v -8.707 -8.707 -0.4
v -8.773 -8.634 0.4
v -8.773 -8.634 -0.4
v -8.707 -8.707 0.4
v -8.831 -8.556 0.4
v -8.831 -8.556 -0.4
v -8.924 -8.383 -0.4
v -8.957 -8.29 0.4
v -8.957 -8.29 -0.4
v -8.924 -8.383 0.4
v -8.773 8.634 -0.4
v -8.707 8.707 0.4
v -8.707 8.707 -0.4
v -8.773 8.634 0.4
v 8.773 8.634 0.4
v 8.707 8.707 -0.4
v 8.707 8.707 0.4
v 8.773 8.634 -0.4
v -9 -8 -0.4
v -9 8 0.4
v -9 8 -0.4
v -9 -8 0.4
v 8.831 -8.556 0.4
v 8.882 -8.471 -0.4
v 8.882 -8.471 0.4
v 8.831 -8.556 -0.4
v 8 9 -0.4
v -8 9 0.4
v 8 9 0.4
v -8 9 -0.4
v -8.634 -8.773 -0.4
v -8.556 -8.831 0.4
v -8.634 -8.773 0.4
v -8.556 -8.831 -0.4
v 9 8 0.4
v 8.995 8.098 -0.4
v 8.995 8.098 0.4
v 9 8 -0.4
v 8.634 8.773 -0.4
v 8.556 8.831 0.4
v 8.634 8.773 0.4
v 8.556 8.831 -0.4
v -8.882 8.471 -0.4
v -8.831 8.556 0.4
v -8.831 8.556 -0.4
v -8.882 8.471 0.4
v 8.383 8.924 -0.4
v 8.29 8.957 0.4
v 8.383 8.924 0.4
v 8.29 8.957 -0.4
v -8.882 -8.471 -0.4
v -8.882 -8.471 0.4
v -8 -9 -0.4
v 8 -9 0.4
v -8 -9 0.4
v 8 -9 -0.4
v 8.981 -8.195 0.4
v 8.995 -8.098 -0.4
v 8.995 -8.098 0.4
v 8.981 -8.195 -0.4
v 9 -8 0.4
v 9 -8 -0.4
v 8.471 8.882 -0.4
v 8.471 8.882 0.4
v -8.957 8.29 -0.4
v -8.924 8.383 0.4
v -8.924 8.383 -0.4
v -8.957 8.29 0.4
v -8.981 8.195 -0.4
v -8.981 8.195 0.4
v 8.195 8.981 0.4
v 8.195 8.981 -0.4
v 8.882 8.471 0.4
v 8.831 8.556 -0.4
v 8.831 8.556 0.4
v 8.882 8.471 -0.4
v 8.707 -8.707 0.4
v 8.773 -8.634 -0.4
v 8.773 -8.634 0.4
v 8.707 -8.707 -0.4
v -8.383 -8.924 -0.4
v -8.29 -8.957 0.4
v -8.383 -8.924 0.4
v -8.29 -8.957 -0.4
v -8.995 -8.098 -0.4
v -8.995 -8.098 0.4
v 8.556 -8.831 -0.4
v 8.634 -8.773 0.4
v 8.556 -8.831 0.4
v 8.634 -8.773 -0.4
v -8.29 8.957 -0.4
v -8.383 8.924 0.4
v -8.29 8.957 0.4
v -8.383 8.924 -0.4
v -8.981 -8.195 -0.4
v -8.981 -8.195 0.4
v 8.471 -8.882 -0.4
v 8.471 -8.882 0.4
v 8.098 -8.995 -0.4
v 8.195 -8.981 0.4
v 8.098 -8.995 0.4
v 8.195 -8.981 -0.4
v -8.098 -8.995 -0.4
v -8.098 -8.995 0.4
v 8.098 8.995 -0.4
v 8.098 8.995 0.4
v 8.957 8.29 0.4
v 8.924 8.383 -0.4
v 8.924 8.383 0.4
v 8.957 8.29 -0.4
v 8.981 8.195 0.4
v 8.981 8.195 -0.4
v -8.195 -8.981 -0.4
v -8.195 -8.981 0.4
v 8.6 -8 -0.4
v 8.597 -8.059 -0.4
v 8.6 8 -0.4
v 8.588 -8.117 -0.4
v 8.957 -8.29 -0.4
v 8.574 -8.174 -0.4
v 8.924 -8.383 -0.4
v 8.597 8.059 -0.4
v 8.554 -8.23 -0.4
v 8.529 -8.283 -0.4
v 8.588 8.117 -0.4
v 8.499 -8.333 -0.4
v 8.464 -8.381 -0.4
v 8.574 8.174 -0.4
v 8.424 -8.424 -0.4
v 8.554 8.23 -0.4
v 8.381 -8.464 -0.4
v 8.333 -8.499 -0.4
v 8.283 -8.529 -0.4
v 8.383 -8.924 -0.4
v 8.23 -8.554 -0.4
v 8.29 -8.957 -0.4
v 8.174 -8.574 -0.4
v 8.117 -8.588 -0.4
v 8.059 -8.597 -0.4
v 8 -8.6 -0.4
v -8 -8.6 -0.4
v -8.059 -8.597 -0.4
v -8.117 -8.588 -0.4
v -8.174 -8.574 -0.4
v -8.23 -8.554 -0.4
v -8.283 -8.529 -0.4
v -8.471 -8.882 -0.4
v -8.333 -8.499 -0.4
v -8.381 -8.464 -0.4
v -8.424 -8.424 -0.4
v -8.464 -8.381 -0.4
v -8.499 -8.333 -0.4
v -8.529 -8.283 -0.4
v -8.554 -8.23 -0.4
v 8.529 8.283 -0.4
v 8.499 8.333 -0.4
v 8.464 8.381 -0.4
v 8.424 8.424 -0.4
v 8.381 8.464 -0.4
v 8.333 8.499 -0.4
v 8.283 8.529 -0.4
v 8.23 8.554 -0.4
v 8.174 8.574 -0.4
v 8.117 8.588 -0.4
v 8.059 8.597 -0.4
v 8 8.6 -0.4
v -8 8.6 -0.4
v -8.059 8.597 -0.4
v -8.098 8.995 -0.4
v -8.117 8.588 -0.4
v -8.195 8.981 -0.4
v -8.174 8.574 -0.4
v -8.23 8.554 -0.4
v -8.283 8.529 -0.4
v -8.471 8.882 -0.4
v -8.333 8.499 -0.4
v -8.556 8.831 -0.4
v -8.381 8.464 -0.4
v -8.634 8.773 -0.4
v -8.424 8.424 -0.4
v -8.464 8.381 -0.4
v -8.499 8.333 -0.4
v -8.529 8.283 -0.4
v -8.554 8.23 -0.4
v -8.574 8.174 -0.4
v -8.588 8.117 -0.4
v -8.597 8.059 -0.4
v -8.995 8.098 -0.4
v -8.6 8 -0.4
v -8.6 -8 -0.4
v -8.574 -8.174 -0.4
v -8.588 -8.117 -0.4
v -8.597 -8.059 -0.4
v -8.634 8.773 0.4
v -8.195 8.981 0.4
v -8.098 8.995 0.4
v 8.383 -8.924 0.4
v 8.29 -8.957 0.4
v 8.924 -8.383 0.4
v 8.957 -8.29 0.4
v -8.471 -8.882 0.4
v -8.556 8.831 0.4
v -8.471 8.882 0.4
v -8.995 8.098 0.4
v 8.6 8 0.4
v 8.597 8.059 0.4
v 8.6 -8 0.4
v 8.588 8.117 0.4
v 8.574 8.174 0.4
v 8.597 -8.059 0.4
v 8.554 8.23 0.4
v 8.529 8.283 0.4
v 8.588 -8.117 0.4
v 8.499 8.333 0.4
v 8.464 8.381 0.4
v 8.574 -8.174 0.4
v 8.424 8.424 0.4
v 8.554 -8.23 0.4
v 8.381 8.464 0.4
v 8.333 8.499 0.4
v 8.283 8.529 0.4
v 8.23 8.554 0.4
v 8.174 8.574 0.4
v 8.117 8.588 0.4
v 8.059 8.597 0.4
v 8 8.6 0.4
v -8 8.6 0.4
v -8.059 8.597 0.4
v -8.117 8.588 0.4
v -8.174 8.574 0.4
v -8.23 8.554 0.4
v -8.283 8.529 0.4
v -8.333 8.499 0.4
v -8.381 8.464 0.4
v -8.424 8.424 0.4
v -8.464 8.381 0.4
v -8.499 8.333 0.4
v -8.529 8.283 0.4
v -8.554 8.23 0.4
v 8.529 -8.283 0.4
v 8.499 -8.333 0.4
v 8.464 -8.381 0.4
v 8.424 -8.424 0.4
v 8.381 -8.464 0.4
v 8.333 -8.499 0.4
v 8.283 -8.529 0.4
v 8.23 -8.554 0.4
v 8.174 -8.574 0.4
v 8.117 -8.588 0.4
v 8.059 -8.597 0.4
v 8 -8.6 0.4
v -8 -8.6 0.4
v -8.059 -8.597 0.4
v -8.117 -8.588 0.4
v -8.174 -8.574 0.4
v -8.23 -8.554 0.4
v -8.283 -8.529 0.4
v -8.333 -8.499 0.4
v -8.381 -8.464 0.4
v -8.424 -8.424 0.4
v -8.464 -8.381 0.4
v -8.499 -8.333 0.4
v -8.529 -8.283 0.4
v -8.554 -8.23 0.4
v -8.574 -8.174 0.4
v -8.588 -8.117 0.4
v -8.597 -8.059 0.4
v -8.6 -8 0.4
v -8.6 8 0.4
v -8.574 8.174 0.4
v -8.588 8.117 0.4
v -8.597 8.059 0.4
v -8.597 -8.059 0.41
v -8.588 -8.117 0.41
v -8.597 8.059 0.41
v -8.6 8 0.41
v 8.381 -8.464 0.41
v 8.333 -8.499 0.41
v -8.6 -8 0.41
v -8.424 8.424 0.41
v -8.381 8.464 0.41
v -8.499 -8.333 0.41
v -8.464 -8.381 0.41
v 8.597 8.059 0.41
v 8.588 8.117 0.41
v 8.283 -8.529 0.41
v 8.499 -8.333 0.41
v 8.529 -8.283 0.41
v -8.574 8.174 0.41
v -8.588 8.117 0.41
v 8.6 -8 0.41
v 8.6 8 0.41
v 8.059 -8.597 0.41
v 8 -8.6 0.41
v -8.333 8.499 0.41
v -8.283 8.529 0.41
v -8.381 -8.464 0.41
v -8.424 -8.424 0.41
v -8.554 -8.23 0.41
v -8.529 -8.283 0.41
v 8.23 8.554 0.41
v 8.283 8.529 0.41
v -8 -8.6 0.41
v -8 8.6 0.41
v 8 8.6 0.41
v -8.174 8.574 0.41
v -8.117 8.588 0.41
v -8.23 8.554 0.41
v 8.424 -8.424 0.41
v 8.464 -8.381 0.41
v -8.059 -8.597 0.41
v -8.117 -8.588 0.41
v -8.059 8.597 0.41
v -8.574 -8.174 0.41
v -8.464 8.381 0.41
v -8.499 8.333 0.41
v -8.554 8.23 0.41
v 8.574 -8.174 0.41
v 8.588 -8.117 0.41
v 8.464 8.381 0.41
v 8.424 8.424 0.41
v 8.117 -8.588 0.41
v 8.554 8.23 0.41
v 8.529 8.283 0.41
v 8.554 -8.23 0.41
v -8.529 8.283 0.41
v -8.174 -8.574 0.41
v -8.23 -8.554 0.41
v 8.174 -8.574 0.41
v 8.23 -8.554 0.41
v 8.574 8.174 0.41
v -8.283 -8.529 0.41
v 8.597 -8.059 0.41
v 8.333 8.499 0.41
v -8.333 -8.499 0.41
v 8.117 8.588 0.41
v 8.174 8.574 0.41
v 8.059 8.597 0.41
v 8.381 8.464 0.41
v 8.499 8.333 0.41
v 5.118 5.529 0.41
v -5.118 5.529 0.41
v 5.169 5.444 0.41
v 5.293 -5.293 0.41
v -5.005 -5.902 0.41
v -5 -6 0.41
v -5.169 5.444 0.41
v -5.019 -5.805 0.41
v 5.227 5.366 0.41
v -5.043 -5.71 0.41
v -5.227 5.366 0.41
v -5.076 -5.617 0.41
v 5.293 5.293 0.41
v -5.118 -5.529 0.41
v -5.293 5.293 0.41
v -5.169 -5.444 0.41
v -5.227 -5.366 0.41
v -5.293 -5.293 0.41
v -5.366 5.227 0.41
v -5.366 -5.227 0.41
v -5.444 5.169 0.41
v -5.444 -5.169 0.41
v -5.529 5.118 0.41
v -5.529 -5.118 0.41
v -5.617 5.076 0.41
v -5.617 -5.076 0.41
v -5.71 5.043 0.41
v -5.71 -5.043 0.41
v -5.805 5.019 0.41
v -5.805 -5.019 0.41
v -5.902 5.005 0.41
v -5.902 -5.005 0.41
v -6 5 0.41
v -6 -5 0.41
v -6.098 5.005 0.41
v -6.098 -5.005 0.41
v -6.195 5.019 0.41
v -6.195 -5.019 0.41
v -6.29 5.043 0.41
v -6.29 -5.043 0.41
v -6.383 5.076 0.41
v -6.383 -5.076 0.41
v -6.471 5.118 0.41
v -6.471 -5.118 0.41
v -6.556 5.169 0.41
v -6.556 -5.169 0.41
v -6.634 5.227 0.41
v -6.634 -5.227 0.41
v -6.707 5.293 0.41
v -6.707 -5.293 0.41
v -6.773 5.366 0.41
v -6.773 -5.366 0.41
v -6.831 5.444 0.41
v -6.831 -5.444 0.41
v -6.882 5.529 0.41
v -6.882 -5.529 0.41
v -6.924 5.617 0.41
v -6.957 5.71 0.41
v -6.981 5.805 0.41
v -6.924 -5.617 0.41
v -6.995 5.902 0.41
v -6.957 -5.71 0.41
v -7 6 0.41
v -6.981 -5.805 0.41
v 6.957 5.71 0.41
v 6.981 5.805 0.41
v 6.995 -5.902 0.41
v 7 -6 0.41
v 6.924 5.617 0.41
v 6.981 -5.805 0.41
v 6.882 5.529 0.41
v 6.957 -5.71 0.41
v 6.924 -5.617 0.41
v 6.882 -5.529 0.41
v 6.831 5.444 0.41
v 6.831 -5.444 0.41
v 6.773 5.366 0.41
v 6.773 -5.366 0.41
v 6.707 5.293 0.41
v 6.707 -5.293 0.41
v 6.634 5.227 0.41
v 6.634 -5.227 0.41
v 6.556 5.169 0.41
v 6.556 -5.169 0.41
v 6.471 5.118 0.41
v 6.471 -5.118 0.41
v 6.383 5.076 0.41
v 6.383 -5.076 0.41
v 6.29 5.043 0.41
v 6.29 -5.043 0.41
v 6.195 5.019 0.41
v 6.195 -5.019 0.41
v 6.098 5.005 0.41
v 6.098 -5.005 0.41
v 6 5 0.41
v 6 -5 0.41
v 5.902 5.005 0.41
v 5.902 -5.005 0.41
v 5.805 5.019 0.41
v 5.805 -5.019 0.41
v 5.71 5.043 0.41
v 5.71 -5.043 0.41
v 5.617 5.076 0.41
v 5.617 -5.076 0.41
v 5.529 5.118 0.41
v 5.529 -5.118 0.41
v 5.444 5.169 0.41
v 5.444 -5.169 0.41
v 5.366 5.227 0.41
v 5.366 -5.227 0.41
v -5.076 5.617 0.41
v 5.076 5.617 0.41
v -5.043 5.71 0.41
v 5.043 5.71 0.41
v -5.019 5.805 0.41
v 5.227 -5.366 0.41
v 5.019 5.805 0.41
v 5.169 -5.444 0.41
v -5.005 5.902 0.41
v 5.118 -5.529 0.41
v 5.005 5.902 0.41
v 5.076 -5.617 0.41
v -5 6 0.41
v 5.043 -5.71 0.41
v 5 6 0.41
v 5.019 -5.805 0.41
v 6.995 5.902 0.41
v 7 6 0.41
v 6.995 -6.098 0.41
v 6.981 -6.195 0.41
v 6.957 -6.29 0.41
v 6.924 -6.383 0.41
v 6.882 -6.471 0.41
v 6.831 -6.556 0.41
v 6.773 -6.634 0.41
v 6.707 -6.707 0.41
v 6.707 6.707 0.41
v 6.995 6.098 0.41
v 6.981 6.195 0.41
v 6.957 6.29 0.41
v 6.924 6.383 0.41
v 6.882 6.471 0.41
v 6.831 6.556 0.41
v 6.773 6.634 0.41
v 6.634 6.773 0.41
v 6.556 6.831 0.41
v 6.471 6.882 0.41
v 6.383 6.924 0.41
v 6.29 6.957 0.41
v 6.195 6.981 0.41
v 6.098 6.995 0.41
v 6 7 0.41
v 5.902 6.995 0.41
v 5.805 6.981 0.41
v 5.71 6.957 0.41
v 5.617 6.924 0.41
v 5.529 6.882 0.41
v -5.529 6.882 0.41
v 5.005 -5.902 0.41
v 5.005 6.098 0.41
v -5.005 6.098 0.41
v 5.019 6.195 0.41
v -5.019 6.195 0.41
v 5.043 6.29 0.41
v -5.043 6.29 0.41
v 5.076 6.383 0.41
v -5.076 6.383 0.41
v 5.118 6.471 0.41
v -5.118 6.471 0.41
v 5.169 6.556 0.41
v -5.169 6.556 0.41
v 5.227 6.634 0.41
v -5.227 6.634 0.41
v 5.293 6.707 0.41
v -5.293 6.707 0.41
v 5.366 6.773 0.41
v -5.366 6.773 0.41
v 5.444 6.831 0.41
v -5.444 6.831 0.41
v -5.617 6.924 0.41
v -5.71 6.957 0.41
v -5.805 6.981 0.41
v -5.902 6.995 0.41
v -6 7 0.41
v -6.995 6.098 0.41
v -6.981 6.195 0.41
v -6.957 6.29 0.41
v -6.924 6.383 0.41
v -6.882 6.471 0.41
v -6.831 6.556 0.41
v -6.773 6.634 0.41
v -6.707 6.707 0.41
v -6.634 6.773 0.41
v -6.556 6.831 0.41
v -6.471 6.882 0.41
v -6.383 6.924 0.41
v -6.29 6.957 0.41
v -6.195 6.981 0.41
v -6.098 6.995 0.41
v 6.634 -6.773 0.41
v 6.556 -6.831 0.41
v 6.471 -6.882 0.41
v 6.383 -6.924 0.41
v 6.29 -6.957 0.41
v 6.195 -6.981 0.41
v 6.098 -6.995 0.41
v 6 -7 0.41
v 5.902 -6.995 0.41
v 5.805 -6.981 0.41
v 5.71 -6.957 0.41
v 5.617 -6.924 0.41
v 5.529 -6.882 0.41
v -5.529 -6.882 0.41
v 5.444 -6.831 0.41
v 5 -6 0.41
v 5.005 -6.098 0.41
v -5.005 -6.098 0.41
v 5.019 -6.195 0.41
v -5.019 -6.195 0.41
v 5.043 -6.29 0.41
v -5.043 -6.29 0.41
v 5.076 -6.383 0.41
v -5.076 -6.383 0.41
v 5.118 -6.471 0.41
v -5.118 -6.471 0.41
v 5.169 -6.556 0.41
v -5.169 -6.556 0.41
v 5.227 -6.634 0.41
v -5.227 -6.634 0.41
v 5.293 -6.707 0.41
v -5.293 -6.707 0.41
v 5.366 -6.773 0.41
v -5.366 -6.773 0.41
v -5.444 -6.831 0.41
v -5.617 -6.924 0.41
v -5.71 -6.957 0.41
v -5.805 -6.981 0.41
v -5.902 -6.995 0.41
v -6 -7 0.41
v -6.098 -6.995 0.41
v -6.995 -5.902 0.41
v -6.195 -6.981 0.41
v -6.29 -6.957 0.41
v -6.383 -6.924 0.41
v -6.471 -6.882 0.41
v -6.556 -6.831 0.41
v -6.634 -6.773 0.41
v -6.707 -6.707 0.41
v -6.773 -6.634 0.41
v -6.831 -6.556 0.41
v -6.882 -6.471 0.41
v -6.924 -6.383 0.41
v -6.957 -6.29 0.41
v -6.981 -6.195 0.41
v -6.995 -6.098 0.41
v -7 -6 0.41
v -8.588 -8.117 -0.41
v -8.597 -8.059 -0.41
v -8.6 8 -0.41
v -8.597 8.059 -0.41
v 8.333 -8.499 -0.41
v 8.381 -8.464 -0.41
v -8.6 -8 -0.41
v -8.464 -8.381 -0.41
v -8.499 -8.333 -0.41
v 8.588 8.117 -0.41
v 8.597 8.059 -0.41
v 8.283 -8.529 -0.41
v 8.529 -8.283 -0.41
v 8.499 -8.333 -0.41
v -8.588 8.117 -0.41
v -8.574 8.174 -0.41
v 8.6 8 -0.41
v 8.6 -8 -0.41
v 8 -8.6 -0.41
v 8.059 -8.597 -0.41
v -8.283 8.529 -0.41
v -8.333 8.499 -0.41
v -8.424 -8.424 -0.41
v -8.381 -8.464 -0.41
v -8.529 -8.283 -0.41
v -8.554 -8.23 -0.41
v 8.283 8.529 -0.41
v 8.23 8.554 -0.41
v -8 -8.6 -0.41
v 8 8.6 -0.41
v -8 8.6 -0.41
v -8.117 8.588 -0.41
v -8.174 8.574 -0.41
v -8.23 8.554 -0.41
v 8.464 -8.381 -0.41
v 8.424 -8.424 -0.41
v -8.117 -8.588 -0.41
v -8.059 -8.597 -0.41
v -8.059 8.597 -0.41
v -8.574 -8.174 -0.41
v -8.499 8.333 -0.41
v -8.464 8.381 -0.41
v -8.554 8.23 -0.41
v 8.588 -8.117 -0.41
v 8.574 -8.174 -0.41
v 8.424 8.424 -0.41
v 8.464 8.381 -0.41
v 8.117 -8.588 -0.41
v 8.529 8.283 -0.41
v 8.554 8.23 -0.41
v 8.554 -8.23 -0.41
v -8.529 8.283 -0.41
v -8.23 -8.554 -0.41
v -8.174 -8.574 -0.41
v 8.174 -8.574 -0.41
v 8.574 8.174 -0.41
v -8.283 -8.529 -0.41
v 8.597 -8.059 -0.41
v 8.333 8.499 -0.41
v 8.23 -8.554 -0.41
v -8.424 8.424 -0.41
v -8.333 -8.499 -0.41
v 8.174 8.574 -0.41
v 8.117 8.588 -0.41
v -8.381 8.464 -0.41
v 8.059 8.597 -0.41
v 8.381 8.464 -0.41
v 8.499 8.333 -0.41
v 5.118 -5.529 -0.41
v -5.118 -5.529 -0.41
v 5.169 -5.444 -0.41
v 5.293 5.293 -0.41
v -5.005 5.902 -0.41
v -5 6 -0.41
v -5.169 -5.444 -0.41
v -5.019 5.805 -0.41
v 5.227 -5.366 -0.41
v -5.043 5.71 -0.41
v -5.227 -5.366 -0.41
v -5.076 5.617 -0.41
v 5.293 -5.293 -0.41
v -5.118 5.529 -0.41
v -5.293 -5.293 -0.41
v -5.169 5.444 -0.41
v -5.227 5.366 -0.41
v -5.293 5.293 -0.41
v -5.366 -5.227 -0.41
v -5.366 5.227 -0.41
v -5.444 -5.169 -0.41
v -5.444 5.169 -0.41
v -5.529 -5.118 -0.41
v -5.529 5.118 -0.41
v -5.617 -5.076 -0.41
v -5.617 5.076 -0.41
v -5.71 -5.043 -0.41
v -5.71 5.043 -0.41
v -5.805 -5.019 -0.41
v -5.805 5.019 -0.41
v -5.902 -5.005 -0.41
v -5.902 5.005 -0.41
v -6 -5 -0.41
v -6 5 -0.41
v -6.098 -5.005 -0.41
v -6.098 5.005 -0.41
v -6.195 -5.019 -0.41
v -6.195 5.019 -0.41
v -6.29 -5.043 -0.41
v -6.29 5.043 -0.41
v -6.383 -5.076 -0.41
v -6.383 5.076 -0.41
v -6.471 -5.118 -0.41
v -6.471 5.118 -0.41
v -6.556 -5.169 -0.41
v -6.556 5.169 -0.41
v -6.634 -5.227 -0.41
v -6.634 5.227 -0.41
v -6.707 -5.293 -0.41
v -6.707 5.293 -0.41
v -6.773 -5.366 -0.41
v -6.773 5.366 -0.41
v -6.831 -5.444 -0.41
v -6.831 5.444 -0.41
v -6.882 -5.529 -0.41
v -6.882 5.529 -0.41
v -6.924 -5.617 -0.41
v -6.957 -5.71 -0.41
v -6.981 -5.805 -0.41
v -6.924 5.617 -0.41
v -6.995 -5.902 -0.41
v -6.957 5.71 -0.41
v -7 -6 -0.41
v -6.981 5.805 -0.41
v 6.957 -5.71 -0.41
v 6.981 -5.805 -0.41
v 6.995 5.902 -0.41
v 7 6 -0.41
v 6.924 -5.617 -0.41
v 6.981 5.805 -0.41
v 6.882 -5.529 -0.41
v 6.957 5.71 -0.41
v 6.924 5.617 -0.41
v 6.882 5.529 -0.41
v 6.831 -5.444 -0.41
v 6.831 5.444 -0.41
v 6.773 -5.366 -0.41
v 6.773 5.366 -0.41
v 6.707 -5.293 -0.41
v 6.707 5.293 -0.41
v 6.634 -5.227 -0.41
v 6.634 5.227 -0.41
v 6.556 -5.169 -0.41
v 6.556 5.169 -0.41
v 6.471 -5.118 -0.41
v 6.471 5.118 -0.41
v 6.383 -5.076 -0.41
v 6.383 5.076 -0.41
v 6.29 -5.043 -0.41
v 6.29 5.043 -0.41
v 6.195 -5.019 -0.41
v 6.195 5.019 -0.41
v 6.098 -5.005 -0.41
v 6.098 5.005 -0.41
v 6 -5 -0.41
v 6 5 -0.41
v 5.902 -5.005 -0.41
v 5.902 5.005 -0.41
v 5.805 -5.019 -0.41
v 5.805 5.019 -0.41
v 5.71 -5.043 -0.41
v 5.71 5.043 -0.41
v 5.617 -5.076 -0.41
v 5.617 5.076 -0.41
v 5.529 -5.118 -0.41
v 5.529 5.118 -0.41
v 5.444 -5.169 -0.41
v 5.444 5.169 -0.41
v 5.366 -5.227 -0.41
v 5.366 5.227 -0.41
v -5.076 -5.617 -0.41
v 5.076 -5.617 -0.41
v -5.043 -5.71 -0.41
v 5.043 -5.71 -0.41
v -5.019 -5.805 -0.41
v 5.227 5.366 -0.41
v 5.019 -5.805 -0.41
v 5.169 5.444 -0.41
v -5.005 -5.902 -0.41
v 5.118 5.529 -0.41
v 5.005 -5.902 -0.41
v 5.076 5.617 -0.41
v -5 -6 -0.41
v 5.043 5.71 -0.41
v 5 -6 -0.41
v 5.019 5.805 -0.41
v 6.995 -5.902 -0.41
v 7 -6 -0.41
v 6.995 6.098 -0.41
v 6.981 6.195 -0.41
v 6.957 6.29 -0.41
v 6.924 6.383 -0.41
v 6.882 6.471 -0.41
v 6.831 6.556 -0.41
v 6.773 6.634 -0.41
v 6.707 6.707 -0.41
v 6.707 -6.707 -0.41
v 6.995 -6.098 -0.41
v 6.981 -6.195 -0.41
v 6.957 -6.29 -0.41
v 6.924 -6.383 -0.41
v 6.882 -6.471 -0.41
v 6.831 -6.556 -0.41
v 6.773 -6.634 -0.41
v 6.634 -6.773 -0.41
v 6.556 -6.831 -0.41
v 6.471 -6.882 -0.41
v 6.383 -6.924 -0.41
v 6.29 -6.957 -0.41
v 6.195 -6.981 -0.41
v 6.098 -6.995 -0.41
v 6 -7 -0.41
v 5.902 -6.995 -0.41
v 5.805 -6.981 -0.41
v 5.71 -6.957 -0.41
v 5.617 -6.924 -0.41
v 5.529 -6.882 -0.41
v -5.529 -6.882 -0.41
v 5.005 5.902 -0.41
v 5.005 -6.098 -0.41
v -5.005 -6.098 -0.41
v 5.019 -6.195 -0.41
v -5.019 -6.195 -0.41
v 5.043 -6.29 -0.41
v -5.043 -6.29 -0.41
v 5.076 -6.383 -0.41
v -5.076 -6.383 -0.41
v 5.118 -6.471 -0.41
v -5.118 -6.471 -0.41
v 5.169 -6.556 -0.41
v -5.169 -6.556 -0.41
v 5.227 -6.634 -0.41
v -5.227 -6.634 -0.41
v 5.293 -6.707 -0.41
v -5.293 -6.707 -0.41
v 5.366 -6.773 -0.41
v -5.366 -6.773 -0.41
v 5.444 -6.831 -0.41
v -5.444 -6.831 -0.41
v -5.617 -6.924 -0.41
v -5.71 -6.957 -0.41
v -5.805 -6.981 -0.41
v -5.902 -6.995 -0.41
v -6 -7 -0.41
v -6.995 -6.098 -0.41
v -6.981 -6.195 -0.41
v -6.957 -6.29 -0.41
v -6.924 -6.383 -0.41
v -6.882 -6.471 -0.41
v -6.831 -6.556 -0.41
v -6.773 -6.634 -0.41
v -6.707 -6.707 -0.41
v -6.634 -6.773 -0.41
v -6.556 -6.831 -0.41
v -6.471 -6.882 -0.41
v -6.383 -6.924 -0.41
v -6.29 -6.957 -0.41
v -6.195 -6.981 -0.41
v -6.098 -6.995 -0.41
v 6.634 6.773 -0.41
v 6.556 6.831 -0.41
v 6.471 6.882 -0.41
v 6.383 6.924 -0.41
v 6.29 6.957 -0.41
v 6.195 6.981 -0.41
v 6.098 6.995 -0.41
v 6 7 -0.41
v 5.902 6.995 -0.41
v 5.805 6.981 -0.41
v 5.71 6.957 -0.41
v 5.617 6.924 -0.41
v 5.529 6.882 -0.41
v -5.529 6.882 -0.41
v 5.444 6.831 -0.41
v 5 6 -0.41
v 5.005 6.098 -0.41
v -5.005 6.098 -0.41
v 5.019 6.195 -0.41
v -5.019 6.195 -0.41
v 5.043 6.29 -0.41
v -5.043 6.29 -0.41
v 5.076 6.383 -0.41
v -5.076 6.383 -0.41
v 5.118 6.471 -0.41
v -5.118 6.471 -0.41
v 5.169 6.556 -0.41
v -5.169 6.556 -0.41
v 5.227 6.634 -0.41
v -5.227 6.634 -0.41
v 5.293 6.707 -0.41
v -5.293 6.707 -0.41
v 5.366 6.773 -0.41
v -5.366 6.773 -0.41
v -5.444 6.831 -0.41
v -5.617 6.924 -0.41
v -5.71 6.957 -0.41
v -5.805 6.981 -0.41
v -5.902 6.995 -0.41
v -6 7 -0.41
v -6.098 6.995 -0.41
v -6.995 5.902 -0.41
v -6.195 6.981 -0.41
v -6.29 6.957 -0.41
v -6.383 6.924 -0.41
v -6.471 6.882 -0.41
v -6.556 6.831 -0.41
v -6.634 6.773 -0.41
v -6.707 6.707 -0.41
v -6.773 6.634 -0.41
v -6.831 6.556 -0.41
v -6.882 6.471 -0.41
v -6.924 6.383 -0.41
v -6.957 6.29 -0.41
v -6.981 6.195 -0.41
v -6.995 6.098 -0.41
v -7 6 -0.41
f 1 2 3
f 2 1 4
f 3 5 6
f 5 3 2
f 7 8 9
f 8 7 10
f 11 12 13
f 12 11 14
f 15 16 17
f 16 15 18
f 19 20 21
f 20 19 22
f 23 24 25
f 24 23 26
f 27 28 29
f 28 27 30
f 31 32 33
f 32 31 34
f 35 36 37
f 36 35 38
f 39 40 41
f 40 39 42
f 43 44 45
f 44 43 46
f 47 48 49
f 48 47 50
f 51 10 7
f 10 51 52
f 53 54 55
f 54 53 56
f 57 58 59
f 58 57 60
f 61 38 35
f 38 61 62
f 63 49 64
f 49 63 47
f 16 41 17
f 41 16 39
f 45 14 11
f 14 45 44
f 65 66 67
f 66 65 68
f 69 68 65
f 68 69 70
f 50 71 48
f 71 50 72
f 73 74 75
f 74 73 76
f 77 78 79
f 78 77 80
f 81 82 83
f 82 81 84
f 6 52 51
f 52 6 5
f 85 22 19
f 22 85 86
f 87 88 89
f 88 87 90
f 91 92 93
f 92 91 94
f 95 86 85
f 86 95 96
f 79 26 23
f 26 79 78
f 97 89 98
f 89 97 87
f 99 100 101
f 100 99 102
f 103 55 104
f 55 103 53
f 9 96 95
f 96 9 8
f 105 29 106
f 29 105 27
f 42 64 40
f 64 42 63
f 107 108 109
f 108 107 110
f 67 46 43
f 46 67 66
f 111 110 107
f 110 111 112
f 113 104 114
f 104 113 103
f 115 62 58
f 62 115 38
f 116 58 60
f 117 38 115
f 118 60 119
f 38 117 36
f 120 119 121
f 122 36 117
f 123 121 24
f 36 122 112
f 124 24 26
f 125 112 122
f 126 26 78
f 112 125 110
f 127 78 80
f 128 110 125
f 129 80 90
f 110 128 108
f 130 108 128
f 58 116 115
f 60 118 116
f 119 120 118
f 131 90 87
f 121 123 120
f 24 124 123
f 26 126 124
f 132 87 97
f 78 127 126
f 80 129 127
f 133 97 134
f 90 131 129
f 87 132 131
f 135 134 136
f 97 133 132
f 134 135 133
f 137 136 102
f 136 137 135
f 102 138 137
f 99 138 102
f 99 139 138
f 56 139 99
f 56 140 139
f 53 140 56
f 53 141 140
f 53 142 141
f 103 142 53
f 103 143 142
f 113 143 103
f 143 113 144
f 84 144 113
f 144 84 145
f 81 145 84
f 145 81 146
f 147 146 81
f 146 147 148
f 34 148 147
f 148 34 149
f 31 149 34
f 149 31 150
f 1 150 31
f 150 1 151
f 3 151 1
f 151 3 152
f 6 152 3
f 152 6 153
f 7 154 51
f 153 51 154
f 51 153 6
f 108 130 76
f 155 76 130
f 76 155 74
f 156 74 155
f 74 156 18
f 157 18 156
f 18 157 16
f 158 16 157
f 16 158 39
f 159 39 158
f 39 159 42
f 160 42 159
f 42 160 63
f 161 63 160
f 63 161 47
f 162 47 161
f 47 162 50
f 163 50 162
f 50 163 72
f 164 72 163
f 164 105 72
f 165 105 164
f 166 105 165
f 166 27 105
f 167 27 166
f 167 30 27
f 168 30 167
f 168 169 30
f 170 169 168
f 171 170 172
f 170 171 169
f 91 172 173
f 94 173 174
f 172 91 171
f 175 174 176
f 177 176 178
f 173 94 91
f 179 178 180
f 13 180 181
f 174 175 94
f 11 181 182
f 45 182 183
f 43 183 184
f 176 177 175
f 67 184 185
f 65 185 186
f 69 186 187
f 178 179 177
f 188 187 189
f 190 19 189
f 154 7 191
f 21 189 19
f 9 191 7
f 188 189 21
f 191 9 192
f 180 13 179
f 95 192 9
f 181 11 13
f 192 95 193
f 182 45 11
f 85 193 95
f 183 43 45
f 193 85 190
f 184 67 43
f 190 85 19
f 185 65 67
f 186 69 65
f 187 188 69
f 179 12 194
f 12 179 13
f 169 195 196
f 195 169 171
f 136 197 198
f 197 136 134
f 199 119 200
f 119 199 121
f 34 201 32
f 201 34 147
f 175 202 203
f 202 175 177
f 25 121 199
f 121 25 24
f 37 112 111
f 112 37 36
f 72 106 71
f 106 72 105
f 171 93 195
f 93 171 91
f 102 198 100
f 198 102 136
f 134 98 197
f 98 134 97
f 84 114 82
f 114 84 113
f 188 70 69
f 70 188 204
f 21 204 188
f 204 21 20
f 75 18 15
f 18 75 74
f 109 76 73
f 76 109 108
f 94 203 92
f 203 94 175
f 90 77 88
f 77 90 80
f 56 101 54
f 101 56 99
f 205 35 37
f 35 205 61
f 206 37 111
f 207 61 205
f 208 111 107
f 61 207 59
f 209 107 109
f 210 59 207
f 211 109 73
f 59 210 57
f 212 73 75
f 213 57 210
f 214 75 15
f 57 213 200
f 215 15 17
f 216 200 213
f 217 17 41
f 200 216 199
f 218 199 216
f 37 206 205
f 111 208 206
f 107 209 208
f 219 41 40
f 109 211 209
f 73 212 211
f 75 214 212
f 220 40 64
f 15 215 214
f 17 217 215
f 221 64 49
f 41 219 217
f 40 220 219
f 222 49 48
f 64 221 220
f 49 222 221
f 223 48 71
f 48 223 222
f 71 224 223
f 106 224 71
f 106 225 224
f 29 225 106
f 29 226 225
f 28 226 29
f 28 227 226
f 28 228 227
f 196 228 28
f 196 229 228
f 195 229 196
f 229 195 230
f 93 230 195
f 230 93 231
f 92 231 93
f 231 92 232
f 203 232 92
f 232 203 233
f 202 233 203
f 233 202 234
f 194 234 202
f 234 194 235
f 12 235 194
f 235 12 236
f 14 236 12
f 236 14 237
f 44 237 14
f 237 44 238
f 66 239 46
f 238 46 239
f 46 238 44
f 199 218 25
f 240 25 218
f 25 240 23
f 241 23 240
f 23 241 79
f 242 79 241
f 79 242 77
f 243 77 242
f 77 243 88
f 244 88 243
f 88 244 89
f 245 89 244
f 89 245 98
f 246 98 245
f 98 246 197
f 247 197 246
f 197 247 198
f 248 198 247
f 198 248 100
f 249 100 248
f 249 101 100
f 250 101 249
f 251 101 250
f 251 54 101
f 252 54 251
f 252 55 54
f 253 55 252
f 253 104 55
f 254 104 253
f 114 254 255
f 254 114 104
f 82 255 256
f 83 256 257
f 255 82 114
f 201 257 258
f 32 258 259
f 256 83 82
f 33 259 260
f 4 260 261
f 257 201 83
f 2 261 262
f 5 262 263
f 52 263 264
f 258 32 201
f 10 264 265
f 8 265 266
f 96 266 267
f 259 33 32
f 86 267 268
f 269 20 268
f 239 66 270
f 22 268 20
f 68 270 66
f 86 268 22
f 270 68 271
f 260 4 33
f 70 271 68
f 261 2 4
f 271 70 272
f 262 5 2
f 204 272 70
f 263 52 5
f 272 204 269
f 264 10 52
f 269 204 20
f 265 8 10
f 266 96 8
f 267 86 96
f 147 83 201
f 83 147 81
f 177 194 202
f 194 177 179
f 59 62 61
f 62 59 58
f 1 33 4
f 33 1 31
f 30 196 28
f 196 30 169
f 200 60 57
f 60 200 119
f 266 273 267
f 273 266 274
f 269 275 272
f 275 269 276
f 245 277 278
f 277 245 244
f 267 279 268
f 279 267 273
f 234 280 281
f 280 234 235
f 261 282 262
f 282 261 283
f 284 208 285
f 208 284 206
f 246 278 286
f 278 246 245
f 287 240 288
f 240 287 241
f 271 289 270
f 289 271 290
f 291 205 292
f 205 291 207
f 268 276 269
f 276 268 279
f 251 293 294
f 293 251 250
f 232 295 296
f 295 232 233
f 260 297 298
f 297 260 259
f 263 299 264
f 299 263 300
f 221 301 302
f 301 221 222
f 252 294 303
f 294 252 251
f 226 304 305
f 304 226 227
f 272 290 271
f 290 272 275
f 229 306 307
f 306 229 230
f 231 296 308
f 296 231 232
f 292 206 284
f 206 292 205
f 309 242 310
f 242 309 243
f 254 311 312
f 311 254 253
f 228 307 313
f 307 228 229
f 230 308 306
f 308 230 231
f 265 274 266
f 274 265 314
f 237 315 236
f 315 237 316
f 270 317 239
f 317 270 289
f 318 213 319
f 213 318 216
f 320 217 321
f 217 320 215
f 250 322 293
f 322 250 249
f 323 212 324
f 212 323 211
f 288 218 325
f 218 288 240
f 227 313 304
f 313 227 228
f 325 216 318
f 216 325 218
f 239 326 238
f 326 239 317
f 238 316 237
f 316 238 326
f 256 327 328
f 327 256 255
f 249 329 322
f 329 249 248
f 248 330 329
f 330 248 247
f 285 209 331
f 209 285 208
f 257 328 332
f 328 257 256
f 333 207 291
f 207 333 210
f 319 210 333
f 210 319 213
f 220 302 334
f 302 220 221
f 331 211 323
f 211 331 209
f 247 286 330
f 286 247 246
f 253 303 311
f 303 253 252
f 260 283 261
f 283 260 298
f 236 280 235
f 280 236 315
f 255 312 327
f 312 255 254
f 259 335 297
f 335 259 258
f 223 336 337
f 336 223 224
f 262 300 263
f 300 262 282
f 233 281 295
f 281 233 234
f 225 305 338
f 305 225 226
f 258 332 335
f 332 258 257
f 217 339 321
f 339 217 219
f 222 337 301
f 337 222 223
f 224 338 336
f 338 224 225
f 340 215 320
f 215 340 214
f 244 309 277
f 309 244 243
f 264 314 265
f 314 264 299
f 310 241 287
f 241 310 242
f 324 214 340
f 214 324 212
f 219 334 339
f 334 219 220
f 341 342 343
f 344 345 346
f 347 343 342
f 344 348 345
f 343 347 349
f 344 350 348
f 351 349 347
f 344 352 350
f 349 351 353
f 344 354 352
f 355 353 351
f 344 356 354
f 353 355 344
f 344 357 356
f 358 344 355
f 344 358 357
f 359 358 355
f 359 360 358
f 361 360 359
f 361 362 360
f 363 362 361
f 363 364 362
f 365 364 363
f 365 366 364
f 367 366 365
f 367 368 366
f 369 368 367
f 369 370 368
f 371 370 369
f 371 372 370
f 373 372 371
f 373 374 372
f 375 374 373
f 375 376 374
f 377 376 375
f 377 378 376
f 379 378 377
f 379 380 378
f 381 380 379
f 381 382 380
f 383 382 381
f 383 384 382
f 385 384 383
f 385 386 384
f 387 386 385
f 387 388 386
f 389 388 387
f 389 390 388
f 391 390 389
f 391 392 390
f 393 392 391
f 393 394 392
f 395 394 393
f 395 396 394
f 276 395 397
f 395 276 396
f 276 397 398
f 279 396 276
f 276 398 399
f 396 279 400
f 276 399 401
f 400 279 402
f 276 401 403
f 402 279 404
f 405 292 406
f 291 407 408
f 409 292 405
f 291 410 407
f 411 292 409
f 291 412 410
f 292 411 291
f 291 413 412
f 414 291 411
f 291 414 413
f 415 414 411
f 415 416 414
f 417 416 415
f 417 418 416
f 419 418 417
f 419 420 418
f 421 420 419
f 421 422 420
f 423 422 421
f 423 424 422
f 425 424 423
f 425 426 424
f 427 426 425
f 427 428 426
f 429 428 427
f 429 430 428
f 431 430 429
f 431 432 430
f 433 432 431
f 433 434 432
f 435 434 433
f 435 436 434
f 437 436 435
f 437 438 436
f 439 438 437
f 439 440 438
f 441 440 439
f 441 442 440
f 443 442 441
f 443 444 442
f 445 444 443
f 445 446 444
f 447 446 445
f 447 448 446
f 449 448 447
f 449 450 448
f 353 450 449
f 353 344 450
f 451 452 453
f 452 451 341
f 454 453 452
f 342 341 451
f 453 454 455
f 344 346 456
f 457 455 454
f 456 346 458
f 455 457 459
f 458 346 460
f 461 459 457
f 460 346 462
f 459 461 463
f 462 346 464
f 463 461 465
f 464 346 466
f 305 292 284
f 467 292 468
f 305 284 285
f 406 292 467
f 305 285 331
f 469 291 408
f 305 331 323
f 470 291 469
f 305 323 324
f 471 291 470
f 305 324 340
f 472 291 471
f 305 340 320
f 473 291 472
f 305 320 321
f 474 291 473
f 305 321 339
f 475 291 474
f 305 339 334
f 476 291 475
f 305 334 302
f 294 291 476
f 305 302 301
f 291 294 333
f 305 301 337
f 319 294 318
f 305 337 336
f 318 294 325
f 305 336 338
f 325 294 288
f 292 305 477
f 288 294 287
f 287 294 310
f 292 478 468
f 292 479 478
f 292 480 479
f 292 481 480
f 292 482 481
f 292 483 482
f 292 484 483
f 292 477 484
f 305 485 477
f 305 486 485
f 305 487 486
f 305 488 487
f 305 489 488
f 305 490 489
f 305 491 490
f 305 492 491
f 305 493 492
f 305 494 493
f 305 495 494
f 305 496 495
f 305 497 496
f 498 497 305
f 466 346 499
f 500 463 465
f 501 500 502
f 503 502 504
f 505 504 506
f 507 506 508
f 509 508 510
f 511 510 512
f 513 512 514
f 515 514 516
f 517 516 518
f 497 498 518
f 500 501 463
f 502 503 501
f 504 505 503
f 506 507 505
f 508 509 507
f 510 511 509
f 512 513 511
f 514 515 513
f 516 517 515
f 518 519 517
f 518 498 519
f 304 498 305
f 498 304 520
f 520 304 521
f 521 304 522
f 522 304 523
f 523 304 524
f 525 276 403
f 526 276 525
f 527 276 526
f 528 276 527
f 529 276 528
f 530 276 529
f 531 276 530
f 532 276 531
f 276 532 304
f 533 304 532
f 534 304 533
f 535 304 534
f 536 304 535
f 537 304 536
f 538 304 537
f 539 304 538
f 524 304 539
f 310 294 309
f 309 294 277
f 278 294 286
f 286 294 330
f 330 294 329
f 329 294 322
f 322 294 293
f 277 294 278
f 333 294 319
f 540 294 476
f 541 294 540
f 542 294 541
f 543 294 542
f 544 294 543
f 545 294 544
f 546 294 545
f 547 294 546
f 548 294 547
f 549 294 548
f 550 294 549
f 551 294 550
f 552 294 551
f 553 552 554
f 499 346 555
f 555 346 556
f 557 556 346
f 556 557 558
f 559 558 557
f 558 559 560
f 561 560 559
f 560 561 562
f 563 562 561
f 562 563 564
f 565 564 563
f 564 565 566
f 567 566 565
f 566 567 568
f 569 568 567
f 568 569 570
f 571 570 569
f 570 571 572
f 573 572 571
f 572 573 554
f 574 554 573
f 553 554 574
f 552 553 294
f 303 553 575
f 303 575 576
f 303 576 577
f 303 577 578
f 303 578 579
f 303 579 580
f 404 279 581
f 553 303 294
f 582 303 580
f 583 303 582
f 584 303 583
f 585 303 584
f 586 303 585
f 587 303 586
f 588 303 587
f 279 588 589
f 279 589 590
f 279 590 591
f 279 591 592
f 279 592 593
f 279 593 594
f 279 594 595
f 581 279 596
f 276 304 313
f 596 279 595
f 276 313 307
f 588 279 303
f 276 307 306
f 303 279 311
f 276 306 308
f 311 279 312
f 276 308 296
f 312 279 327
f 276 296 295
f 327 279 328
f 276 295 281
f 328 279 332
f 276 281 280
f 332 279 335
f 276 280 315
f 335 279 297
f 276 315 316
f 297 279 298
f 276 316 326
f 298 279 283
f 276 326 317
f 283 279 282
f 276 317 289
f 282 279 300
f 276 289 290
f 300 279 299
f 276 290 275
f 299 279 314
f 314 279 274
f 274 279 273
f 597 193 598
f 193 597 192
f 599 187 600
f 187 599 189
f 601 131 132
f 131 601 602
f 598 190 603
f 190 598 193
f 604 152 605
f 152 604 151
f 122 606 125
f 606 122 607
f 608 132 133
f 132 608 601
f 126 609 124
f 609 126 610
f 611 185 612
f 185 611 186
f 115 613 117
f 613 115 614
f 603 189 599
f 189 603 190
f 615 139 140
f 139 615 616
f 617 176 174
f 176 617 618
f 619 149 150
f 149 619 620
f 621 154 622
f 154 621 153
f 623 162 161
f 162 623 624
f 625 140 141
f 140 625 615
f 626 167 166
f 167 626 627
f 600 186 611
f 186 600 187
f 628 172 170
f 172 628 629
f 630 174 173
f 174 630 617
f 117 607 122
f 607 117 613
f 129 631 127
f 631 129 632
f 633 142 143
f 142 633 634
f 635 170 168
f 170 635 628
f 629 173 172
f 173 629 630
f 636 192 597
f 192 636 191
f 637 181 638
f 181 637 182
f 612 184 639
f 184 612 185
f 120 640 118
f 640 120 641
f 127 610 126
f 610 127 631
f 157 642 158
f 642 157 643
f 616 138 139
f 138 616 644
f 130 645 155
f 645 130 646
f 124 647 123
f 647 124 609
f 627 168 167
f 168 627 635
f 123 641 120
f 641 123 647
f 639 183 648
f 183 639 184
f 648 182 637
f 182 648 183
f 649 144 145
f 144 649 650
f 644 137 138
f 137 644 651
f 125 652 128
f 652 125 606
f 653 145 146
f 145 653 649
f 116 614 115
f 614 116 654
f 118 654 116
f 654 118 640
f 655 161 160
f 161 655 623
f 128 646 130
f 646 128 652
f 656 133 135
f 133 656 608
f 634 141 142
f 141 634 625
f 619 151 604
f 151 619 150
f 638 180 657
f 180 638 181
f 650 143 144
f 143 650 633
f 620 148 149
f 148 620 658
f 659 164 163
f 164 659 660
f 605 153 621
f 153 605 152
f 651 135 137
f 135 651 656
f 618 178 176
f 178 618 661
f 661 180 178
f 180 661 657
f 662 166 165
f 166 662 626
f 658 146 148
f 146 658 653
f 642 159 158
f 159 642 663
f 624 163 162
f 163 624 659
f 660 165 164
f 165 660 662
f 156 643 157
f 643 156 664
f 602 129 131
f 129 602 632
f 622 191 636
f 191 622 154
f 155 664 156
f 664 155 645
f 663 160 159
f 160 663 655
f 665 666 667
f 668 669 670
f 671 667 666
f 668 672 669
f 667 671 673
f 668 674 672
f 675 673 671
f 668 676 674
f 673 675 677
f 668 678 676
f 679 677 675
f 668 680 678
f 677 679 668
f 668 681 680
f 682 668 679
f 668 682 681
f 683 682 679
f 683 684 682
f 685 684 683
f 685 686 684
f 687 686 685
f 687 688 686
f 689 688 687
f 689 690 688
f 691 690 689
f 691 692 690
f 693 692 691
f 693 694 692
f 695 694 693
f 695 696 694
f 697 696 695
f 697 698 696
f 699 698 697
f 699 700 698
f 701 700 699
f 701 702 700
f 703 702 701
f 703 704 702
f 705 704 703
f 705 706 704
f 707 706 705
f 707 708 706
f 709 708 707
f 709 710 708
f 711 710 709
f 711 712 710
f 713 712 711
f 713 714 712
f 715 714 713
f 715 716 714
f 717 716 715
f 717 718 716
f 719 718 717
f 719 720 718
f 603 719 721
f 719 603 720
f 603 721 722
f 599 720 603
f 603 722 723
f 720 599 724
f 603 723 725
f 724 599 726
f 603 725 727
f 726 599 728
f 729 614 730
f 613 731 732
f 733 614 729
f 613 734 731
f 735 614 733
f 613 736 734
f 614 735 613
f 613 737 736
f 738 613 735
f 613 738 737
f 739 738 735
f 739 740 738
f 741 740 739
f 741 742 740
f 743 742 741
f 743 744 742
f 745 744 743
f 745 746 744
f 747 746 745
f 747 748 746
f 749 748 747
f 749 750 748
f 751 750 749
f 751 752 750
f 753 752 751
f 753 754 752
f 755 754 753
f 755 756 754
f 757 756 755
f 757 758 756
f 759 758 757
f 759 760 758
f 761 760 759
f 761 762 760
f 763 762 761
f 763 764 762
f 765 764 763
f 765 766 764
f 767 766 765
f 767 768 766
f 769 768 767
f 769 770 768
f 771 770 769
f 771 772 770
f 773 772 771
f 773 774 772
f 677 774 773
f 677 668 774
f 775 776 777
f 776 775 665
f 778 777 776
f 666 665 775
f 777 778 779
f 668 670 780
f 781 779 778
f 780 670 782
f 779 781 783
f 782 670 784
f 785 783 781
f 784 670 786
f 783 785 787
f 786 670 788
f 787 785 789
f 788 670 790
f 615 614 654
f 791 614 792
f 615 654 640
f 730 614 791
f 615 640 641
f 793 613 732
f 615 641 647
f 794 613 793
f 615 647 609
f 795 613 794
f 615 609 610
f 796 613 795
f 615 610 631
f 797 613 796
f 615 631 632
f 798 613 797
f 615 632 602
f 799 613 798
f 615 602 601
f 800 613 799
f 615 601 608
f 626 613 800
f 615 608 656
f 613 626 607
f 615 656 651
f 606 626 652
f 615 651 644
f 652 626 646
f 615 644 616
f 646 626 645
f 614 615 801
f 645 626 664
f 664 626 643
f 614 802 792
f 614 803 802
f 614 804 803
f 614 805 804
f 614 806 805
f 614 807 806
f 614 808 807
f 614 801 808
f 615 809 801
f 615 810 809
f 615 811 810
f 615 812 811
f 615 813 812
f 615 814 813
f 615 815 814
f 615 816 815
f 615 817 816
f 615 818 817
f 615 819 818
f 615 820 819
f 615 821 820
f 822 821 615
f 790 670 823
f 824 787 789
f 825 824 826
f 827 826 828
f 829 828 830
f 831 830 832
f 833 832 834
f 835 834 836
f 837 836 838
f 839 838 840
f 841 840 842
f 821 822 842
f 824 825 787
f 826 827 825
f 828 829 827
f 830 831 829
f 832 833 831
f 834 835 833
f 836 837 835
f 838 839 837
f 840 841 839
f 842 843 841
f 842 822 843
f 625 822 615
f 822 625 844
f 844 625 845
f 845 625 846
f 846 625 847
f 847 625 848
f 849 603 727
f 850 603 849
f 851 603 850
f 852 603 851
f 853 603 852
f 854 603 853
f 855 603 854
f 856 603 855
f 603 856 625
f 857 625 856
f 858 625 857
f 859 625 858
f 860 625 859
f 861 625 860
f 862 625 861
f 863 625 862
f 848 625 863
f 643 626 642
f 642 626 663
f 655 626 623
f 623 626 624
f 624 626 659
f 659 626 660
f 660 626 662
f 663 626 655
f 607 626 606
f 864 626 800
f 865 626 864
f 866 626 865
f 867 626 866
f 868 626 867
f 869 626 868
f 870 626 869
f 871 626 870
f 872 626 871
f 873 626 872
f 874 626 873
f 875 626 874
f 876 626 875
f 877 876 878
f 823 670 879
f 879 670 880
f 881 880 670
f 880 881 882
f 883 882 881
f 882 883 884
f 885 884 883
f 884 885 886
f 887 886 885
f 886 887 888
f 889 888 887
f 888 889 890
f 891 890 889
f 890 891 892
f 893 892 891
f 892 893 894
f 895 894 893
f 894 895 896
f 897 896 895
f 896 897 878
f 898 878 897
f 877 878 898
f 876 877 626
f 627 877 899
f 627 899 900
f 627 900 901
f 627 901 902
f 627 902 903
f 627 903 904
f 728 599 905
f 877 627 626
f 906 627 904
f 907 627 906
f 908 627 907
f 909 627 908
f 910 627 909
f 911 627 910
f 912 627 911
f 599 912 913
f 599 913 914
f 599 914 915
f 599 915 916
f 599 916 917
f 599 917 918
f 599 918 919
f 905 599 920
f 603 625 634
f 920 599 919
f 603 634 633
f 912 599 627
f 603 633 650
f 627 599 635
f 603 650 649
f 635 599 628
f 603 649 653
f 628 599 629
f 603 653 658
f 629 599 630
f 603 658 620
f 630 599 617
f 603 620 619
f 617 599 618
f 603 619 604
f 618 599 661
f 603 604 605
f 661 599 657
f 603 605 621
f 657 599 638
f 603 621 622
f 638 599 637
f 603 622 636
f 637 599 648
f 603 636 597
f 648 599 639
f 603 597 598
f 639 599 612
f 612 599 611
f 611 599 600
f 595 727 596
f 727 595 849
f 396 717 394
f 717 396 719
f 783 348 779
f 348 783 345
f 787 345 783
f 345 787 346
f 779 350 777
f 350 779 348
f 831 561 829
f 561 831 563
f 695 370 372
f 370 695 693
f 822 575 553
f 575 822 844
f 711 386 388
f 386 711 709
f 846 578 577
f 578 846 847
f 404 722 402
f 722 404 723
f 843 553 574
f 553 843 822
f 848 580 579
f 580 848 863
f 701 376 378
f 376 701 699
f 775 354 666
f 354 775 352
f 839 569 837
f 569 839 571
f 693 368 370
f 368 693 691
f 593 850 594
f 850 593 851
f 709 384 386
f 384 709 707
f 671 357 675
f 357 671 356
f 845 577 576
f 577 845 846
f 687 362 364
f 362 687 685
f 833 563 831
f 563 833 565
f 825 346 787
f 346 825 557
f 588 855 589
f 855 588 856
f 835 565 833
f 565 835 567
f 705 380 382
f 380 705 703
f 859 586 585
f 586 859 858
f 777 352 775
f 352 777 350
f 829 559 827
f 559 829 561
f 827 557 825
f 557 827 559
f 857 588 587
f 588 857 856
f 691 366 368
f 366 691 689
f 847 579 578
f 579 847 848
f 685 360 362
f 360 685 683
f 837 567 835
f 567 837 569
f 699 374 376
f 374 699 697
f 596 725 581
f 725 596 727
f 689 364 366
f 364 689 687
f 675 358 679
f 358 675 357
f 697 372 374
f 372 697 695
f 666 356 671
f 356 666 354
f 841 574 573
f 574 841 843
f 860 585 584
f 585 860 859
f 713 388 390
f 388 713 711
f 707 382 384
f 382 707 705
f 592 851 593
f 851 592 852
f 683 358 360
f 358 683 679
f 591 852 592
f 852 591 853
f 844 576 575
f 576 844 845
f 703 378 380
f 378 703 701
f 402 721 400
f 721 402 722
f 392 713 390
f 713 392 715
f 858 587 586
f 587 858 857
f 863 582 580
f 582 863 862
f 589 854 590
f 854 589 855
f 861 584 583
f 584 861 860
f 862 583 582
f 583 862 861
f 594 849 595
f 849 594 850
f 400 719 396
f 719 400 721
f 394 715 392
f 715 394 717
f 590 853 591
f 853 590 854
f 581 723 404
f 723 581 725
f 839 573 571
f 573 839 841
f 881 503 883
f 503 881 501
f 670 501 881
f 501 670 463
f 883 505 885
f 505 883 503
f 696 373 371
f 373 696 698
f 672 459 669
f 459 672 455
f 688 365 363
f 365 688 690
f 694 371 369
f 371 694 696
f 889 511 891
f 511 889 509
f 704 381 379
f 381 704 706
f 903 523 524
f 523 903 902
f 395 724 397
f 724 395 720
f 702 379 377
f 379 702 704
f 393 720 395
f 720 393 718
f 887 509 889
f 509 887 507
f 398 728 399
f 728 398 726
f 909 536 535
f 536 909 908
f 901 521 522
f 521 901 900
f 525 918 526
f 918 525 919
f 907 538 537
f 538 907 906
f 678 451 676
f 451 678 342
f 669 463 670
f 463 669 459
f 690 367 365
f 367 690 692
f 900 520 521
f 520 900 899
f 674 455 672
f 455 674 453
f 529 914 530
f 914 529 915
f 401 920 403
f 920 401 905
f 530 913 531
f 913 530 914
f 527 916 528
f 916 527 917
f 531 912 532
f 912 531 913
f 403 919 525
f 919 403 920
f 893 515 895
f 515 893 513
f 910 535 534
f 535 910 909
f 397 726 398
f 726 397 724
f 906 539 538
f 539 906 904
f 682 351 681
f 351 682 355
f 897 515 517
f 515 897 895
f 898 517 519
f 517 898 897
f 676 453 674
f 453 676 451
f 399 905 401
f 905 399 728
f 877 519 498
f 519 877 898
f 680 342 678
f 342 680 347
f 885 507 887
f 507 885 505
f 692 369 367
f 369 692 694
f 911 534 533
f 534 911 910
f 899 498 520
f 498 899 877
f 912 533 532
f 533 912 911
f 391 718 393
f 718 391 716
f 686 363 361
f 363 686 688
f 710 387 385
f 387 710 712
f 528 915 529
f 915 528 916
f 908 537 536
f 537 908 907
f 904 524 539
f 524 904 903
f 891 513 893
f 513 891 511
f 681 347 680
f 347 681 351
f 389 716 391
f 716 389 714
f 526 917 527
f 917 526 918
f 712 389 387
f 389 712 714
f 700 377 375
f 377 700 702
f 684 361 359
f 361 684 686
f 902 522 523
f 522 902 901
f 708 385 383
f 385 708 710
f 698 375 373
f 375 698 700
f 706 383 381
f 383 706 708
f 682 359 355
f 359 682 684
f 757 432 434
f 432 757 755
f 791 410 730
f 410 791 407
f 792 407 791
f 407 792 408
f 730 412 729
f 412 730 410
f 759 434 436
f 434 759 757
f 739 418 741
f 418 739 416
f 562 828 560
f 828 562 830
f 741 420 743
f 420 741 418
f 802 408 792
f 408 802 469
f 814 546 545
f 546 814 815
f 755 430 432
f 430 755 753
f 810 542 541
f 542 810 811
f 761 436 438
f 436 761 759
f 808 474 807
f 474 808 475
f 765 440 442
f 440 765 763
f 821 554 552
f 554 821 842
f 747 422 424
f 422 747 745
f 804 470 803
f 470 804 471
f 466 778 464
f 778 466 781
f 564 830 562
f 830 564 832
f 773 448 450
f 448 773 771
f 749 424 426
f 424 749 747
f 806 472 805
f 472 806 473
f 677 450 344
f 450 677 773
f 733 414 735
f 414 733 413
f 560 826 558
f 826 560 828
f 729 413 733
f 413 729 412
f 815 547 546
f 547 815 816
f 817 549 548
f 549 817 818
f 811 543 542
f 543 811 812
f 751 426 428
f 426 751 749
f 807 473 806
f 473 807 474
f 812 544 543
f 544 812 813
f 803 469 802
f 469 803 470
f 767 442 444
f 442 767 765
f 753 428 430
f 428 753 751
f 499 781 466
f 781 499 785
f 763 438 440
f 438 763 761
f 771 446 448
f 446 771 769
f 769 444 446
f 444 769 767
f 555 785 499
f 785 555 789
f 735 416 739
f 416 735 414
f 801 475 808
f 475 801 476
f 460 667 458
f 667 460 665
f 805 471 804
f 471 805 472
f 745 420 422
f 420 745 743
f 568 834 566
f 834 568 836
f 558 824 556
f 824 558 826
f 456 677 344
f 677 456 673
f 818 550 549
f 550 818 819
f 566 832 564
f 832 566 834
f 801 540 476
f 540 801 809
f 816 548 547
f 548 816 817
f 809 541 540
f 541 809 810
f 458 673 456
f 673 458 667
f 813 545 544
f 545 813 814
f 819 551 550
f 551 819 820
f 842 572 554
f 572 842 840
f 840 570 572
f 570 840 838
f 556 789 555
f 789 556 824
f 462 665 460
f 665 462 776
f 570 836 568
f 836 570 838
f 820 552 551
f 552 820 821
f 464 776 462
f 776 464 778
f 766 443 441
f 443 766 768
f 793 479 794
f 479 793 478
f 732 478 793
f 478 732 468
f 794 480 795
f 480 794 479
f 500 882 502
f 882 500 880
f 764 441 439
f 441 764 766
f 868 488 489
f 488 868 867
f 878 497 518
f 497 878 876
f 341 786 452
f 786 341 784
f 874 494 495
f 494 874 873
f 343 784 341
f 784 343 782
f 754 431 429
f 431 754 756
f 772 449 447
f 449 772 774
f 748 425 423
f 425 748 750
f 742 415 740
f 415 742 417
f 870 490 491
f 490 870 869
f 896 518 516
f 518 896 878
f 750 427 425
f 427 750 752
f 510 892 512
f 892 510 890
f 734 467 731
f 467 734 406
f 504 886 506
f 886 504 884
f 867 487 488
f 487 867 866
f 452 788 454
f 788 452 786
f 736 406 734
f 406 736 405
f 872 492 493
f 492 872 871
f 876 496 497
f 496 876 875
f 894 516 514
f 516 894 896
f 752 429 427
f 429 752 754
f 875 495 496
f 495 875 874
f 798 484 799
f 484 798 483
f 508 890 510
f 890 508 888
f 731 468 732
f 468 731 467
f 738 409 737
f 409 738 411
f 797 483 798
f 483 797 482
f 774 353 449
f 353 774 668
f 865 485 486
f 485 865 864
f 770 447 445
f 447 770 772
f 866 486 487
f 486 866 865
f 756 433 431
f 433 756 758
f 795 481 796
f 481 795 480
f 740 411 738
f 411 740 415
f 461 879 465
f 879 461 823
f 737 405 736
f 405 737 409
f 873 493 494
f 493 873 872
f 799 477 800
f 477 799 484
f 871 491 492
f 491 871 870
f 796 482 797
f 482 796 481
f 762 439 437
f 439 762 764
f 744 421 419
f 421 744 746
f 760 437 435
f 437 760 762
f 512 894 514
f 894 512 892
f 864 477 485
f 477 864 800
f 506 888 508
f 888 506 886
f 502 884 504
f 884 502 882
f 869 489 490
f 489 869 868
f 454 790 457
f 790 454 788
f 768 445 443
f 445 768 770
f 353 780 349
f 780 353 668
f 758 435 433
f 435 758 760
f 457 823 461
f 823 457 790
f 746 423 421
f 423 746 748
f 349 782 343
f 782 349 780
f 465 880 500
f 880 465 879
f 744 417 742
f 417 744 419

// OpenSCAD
// 18.0mm x 18.0mm PCB, 0.8mm thick (single connected solid)
// All decorative layers are fused into the core so the result is ONE manifold solid.

$fn = 64;

// Parameters
pcb_L = 18.0;
pcb_W = 18.0;
pcb_T = 0.8;

corner_R = 1.0;

hole_d = 2.0;
hole_edge_margin = 3.0;

// Visual/relief details (kept small and FUSED into the core)
copper_relief = 0.03;   // raised copper detail (fused)
mask_relief   = 0.02;   // raised soldermask detail (fused)
silk_relief   = 0.01;   // raised silkscreen detail (fused)
layer_inset   = 0.25;   // inset from board edge for layers

// Robust overlap for boolean ops (small, dimension-derived)
eps = max(0.02, pcb_T/200);
cut_h = pcb_T + 2*eps;

// ---- Helpers ----
module rounded_rect_2d(L, W, R) {
    // Clamp radius to valid range
    r = min(R, min(L, W)/2 - eps);
    hull() {
        for (sx = [-1, 1], sy = [-1, 1])
            translate([sx*(L/2 - r), sy*(W/2 - r)]) circle(r=r);
    }
}

module pcb_core() {
    linear_extrude(height=pcb_T, center=true)
        rounded_rect_2d(pcb_L, pcb_W, corner_R);
}

module mount_holes() {
    for (sx = [-1, 1], sy = [-1, 1])
        translate([sx*(pcb_L/2 - hole_edge_margin),
                   sy*(pcb_W/2 - hole_edge_margin),
                   0])
            cylinder(d=hole_d, h=cut_h, center=true);
}

module top_relief(h, inset) {
    // Fused raised detail on top surface
    translate([0, 0, pcb_T/2 - eps + h/2])
        linear_extrude(height=h, center=true)
            rounded_rect_2d(pcb_L - 2*inset, pcb_W - 2*inset, max(corner_R - inset, 0.2));
}

module bottom_relief(h, inset) {
    // Fused raised detail on bottom surface
    translate([0, 0, -pcb_T/2 + eps - h/2])
        linear_extrude(height=h, center=true)
            rounded_rect_2d(pcb_L - 2*inset, pcb_W - 2*inset, max(corner_R - inset, 0.2));
}

// ---- Final: ONE connected solid ----
difference() {
    union() {
        // Core board
        pcb_core();

        // Fused surface details (kept subtle but visible)
        top_relief(mask_relief, layer_inset);
        bottom_relief(mask_relief, layer_inset);

        top_relief(copper_relief, layer_inset + 0.15);
        bottom_relief(copper_relief, layer_inset + 0.15);

        top_relief(silk_relief, layer_inset + 0.45);
        bottom_relief(silk_relief, layer_inset + 0.45);
    }

    // Through mounting holes
    mount_holes();
}
